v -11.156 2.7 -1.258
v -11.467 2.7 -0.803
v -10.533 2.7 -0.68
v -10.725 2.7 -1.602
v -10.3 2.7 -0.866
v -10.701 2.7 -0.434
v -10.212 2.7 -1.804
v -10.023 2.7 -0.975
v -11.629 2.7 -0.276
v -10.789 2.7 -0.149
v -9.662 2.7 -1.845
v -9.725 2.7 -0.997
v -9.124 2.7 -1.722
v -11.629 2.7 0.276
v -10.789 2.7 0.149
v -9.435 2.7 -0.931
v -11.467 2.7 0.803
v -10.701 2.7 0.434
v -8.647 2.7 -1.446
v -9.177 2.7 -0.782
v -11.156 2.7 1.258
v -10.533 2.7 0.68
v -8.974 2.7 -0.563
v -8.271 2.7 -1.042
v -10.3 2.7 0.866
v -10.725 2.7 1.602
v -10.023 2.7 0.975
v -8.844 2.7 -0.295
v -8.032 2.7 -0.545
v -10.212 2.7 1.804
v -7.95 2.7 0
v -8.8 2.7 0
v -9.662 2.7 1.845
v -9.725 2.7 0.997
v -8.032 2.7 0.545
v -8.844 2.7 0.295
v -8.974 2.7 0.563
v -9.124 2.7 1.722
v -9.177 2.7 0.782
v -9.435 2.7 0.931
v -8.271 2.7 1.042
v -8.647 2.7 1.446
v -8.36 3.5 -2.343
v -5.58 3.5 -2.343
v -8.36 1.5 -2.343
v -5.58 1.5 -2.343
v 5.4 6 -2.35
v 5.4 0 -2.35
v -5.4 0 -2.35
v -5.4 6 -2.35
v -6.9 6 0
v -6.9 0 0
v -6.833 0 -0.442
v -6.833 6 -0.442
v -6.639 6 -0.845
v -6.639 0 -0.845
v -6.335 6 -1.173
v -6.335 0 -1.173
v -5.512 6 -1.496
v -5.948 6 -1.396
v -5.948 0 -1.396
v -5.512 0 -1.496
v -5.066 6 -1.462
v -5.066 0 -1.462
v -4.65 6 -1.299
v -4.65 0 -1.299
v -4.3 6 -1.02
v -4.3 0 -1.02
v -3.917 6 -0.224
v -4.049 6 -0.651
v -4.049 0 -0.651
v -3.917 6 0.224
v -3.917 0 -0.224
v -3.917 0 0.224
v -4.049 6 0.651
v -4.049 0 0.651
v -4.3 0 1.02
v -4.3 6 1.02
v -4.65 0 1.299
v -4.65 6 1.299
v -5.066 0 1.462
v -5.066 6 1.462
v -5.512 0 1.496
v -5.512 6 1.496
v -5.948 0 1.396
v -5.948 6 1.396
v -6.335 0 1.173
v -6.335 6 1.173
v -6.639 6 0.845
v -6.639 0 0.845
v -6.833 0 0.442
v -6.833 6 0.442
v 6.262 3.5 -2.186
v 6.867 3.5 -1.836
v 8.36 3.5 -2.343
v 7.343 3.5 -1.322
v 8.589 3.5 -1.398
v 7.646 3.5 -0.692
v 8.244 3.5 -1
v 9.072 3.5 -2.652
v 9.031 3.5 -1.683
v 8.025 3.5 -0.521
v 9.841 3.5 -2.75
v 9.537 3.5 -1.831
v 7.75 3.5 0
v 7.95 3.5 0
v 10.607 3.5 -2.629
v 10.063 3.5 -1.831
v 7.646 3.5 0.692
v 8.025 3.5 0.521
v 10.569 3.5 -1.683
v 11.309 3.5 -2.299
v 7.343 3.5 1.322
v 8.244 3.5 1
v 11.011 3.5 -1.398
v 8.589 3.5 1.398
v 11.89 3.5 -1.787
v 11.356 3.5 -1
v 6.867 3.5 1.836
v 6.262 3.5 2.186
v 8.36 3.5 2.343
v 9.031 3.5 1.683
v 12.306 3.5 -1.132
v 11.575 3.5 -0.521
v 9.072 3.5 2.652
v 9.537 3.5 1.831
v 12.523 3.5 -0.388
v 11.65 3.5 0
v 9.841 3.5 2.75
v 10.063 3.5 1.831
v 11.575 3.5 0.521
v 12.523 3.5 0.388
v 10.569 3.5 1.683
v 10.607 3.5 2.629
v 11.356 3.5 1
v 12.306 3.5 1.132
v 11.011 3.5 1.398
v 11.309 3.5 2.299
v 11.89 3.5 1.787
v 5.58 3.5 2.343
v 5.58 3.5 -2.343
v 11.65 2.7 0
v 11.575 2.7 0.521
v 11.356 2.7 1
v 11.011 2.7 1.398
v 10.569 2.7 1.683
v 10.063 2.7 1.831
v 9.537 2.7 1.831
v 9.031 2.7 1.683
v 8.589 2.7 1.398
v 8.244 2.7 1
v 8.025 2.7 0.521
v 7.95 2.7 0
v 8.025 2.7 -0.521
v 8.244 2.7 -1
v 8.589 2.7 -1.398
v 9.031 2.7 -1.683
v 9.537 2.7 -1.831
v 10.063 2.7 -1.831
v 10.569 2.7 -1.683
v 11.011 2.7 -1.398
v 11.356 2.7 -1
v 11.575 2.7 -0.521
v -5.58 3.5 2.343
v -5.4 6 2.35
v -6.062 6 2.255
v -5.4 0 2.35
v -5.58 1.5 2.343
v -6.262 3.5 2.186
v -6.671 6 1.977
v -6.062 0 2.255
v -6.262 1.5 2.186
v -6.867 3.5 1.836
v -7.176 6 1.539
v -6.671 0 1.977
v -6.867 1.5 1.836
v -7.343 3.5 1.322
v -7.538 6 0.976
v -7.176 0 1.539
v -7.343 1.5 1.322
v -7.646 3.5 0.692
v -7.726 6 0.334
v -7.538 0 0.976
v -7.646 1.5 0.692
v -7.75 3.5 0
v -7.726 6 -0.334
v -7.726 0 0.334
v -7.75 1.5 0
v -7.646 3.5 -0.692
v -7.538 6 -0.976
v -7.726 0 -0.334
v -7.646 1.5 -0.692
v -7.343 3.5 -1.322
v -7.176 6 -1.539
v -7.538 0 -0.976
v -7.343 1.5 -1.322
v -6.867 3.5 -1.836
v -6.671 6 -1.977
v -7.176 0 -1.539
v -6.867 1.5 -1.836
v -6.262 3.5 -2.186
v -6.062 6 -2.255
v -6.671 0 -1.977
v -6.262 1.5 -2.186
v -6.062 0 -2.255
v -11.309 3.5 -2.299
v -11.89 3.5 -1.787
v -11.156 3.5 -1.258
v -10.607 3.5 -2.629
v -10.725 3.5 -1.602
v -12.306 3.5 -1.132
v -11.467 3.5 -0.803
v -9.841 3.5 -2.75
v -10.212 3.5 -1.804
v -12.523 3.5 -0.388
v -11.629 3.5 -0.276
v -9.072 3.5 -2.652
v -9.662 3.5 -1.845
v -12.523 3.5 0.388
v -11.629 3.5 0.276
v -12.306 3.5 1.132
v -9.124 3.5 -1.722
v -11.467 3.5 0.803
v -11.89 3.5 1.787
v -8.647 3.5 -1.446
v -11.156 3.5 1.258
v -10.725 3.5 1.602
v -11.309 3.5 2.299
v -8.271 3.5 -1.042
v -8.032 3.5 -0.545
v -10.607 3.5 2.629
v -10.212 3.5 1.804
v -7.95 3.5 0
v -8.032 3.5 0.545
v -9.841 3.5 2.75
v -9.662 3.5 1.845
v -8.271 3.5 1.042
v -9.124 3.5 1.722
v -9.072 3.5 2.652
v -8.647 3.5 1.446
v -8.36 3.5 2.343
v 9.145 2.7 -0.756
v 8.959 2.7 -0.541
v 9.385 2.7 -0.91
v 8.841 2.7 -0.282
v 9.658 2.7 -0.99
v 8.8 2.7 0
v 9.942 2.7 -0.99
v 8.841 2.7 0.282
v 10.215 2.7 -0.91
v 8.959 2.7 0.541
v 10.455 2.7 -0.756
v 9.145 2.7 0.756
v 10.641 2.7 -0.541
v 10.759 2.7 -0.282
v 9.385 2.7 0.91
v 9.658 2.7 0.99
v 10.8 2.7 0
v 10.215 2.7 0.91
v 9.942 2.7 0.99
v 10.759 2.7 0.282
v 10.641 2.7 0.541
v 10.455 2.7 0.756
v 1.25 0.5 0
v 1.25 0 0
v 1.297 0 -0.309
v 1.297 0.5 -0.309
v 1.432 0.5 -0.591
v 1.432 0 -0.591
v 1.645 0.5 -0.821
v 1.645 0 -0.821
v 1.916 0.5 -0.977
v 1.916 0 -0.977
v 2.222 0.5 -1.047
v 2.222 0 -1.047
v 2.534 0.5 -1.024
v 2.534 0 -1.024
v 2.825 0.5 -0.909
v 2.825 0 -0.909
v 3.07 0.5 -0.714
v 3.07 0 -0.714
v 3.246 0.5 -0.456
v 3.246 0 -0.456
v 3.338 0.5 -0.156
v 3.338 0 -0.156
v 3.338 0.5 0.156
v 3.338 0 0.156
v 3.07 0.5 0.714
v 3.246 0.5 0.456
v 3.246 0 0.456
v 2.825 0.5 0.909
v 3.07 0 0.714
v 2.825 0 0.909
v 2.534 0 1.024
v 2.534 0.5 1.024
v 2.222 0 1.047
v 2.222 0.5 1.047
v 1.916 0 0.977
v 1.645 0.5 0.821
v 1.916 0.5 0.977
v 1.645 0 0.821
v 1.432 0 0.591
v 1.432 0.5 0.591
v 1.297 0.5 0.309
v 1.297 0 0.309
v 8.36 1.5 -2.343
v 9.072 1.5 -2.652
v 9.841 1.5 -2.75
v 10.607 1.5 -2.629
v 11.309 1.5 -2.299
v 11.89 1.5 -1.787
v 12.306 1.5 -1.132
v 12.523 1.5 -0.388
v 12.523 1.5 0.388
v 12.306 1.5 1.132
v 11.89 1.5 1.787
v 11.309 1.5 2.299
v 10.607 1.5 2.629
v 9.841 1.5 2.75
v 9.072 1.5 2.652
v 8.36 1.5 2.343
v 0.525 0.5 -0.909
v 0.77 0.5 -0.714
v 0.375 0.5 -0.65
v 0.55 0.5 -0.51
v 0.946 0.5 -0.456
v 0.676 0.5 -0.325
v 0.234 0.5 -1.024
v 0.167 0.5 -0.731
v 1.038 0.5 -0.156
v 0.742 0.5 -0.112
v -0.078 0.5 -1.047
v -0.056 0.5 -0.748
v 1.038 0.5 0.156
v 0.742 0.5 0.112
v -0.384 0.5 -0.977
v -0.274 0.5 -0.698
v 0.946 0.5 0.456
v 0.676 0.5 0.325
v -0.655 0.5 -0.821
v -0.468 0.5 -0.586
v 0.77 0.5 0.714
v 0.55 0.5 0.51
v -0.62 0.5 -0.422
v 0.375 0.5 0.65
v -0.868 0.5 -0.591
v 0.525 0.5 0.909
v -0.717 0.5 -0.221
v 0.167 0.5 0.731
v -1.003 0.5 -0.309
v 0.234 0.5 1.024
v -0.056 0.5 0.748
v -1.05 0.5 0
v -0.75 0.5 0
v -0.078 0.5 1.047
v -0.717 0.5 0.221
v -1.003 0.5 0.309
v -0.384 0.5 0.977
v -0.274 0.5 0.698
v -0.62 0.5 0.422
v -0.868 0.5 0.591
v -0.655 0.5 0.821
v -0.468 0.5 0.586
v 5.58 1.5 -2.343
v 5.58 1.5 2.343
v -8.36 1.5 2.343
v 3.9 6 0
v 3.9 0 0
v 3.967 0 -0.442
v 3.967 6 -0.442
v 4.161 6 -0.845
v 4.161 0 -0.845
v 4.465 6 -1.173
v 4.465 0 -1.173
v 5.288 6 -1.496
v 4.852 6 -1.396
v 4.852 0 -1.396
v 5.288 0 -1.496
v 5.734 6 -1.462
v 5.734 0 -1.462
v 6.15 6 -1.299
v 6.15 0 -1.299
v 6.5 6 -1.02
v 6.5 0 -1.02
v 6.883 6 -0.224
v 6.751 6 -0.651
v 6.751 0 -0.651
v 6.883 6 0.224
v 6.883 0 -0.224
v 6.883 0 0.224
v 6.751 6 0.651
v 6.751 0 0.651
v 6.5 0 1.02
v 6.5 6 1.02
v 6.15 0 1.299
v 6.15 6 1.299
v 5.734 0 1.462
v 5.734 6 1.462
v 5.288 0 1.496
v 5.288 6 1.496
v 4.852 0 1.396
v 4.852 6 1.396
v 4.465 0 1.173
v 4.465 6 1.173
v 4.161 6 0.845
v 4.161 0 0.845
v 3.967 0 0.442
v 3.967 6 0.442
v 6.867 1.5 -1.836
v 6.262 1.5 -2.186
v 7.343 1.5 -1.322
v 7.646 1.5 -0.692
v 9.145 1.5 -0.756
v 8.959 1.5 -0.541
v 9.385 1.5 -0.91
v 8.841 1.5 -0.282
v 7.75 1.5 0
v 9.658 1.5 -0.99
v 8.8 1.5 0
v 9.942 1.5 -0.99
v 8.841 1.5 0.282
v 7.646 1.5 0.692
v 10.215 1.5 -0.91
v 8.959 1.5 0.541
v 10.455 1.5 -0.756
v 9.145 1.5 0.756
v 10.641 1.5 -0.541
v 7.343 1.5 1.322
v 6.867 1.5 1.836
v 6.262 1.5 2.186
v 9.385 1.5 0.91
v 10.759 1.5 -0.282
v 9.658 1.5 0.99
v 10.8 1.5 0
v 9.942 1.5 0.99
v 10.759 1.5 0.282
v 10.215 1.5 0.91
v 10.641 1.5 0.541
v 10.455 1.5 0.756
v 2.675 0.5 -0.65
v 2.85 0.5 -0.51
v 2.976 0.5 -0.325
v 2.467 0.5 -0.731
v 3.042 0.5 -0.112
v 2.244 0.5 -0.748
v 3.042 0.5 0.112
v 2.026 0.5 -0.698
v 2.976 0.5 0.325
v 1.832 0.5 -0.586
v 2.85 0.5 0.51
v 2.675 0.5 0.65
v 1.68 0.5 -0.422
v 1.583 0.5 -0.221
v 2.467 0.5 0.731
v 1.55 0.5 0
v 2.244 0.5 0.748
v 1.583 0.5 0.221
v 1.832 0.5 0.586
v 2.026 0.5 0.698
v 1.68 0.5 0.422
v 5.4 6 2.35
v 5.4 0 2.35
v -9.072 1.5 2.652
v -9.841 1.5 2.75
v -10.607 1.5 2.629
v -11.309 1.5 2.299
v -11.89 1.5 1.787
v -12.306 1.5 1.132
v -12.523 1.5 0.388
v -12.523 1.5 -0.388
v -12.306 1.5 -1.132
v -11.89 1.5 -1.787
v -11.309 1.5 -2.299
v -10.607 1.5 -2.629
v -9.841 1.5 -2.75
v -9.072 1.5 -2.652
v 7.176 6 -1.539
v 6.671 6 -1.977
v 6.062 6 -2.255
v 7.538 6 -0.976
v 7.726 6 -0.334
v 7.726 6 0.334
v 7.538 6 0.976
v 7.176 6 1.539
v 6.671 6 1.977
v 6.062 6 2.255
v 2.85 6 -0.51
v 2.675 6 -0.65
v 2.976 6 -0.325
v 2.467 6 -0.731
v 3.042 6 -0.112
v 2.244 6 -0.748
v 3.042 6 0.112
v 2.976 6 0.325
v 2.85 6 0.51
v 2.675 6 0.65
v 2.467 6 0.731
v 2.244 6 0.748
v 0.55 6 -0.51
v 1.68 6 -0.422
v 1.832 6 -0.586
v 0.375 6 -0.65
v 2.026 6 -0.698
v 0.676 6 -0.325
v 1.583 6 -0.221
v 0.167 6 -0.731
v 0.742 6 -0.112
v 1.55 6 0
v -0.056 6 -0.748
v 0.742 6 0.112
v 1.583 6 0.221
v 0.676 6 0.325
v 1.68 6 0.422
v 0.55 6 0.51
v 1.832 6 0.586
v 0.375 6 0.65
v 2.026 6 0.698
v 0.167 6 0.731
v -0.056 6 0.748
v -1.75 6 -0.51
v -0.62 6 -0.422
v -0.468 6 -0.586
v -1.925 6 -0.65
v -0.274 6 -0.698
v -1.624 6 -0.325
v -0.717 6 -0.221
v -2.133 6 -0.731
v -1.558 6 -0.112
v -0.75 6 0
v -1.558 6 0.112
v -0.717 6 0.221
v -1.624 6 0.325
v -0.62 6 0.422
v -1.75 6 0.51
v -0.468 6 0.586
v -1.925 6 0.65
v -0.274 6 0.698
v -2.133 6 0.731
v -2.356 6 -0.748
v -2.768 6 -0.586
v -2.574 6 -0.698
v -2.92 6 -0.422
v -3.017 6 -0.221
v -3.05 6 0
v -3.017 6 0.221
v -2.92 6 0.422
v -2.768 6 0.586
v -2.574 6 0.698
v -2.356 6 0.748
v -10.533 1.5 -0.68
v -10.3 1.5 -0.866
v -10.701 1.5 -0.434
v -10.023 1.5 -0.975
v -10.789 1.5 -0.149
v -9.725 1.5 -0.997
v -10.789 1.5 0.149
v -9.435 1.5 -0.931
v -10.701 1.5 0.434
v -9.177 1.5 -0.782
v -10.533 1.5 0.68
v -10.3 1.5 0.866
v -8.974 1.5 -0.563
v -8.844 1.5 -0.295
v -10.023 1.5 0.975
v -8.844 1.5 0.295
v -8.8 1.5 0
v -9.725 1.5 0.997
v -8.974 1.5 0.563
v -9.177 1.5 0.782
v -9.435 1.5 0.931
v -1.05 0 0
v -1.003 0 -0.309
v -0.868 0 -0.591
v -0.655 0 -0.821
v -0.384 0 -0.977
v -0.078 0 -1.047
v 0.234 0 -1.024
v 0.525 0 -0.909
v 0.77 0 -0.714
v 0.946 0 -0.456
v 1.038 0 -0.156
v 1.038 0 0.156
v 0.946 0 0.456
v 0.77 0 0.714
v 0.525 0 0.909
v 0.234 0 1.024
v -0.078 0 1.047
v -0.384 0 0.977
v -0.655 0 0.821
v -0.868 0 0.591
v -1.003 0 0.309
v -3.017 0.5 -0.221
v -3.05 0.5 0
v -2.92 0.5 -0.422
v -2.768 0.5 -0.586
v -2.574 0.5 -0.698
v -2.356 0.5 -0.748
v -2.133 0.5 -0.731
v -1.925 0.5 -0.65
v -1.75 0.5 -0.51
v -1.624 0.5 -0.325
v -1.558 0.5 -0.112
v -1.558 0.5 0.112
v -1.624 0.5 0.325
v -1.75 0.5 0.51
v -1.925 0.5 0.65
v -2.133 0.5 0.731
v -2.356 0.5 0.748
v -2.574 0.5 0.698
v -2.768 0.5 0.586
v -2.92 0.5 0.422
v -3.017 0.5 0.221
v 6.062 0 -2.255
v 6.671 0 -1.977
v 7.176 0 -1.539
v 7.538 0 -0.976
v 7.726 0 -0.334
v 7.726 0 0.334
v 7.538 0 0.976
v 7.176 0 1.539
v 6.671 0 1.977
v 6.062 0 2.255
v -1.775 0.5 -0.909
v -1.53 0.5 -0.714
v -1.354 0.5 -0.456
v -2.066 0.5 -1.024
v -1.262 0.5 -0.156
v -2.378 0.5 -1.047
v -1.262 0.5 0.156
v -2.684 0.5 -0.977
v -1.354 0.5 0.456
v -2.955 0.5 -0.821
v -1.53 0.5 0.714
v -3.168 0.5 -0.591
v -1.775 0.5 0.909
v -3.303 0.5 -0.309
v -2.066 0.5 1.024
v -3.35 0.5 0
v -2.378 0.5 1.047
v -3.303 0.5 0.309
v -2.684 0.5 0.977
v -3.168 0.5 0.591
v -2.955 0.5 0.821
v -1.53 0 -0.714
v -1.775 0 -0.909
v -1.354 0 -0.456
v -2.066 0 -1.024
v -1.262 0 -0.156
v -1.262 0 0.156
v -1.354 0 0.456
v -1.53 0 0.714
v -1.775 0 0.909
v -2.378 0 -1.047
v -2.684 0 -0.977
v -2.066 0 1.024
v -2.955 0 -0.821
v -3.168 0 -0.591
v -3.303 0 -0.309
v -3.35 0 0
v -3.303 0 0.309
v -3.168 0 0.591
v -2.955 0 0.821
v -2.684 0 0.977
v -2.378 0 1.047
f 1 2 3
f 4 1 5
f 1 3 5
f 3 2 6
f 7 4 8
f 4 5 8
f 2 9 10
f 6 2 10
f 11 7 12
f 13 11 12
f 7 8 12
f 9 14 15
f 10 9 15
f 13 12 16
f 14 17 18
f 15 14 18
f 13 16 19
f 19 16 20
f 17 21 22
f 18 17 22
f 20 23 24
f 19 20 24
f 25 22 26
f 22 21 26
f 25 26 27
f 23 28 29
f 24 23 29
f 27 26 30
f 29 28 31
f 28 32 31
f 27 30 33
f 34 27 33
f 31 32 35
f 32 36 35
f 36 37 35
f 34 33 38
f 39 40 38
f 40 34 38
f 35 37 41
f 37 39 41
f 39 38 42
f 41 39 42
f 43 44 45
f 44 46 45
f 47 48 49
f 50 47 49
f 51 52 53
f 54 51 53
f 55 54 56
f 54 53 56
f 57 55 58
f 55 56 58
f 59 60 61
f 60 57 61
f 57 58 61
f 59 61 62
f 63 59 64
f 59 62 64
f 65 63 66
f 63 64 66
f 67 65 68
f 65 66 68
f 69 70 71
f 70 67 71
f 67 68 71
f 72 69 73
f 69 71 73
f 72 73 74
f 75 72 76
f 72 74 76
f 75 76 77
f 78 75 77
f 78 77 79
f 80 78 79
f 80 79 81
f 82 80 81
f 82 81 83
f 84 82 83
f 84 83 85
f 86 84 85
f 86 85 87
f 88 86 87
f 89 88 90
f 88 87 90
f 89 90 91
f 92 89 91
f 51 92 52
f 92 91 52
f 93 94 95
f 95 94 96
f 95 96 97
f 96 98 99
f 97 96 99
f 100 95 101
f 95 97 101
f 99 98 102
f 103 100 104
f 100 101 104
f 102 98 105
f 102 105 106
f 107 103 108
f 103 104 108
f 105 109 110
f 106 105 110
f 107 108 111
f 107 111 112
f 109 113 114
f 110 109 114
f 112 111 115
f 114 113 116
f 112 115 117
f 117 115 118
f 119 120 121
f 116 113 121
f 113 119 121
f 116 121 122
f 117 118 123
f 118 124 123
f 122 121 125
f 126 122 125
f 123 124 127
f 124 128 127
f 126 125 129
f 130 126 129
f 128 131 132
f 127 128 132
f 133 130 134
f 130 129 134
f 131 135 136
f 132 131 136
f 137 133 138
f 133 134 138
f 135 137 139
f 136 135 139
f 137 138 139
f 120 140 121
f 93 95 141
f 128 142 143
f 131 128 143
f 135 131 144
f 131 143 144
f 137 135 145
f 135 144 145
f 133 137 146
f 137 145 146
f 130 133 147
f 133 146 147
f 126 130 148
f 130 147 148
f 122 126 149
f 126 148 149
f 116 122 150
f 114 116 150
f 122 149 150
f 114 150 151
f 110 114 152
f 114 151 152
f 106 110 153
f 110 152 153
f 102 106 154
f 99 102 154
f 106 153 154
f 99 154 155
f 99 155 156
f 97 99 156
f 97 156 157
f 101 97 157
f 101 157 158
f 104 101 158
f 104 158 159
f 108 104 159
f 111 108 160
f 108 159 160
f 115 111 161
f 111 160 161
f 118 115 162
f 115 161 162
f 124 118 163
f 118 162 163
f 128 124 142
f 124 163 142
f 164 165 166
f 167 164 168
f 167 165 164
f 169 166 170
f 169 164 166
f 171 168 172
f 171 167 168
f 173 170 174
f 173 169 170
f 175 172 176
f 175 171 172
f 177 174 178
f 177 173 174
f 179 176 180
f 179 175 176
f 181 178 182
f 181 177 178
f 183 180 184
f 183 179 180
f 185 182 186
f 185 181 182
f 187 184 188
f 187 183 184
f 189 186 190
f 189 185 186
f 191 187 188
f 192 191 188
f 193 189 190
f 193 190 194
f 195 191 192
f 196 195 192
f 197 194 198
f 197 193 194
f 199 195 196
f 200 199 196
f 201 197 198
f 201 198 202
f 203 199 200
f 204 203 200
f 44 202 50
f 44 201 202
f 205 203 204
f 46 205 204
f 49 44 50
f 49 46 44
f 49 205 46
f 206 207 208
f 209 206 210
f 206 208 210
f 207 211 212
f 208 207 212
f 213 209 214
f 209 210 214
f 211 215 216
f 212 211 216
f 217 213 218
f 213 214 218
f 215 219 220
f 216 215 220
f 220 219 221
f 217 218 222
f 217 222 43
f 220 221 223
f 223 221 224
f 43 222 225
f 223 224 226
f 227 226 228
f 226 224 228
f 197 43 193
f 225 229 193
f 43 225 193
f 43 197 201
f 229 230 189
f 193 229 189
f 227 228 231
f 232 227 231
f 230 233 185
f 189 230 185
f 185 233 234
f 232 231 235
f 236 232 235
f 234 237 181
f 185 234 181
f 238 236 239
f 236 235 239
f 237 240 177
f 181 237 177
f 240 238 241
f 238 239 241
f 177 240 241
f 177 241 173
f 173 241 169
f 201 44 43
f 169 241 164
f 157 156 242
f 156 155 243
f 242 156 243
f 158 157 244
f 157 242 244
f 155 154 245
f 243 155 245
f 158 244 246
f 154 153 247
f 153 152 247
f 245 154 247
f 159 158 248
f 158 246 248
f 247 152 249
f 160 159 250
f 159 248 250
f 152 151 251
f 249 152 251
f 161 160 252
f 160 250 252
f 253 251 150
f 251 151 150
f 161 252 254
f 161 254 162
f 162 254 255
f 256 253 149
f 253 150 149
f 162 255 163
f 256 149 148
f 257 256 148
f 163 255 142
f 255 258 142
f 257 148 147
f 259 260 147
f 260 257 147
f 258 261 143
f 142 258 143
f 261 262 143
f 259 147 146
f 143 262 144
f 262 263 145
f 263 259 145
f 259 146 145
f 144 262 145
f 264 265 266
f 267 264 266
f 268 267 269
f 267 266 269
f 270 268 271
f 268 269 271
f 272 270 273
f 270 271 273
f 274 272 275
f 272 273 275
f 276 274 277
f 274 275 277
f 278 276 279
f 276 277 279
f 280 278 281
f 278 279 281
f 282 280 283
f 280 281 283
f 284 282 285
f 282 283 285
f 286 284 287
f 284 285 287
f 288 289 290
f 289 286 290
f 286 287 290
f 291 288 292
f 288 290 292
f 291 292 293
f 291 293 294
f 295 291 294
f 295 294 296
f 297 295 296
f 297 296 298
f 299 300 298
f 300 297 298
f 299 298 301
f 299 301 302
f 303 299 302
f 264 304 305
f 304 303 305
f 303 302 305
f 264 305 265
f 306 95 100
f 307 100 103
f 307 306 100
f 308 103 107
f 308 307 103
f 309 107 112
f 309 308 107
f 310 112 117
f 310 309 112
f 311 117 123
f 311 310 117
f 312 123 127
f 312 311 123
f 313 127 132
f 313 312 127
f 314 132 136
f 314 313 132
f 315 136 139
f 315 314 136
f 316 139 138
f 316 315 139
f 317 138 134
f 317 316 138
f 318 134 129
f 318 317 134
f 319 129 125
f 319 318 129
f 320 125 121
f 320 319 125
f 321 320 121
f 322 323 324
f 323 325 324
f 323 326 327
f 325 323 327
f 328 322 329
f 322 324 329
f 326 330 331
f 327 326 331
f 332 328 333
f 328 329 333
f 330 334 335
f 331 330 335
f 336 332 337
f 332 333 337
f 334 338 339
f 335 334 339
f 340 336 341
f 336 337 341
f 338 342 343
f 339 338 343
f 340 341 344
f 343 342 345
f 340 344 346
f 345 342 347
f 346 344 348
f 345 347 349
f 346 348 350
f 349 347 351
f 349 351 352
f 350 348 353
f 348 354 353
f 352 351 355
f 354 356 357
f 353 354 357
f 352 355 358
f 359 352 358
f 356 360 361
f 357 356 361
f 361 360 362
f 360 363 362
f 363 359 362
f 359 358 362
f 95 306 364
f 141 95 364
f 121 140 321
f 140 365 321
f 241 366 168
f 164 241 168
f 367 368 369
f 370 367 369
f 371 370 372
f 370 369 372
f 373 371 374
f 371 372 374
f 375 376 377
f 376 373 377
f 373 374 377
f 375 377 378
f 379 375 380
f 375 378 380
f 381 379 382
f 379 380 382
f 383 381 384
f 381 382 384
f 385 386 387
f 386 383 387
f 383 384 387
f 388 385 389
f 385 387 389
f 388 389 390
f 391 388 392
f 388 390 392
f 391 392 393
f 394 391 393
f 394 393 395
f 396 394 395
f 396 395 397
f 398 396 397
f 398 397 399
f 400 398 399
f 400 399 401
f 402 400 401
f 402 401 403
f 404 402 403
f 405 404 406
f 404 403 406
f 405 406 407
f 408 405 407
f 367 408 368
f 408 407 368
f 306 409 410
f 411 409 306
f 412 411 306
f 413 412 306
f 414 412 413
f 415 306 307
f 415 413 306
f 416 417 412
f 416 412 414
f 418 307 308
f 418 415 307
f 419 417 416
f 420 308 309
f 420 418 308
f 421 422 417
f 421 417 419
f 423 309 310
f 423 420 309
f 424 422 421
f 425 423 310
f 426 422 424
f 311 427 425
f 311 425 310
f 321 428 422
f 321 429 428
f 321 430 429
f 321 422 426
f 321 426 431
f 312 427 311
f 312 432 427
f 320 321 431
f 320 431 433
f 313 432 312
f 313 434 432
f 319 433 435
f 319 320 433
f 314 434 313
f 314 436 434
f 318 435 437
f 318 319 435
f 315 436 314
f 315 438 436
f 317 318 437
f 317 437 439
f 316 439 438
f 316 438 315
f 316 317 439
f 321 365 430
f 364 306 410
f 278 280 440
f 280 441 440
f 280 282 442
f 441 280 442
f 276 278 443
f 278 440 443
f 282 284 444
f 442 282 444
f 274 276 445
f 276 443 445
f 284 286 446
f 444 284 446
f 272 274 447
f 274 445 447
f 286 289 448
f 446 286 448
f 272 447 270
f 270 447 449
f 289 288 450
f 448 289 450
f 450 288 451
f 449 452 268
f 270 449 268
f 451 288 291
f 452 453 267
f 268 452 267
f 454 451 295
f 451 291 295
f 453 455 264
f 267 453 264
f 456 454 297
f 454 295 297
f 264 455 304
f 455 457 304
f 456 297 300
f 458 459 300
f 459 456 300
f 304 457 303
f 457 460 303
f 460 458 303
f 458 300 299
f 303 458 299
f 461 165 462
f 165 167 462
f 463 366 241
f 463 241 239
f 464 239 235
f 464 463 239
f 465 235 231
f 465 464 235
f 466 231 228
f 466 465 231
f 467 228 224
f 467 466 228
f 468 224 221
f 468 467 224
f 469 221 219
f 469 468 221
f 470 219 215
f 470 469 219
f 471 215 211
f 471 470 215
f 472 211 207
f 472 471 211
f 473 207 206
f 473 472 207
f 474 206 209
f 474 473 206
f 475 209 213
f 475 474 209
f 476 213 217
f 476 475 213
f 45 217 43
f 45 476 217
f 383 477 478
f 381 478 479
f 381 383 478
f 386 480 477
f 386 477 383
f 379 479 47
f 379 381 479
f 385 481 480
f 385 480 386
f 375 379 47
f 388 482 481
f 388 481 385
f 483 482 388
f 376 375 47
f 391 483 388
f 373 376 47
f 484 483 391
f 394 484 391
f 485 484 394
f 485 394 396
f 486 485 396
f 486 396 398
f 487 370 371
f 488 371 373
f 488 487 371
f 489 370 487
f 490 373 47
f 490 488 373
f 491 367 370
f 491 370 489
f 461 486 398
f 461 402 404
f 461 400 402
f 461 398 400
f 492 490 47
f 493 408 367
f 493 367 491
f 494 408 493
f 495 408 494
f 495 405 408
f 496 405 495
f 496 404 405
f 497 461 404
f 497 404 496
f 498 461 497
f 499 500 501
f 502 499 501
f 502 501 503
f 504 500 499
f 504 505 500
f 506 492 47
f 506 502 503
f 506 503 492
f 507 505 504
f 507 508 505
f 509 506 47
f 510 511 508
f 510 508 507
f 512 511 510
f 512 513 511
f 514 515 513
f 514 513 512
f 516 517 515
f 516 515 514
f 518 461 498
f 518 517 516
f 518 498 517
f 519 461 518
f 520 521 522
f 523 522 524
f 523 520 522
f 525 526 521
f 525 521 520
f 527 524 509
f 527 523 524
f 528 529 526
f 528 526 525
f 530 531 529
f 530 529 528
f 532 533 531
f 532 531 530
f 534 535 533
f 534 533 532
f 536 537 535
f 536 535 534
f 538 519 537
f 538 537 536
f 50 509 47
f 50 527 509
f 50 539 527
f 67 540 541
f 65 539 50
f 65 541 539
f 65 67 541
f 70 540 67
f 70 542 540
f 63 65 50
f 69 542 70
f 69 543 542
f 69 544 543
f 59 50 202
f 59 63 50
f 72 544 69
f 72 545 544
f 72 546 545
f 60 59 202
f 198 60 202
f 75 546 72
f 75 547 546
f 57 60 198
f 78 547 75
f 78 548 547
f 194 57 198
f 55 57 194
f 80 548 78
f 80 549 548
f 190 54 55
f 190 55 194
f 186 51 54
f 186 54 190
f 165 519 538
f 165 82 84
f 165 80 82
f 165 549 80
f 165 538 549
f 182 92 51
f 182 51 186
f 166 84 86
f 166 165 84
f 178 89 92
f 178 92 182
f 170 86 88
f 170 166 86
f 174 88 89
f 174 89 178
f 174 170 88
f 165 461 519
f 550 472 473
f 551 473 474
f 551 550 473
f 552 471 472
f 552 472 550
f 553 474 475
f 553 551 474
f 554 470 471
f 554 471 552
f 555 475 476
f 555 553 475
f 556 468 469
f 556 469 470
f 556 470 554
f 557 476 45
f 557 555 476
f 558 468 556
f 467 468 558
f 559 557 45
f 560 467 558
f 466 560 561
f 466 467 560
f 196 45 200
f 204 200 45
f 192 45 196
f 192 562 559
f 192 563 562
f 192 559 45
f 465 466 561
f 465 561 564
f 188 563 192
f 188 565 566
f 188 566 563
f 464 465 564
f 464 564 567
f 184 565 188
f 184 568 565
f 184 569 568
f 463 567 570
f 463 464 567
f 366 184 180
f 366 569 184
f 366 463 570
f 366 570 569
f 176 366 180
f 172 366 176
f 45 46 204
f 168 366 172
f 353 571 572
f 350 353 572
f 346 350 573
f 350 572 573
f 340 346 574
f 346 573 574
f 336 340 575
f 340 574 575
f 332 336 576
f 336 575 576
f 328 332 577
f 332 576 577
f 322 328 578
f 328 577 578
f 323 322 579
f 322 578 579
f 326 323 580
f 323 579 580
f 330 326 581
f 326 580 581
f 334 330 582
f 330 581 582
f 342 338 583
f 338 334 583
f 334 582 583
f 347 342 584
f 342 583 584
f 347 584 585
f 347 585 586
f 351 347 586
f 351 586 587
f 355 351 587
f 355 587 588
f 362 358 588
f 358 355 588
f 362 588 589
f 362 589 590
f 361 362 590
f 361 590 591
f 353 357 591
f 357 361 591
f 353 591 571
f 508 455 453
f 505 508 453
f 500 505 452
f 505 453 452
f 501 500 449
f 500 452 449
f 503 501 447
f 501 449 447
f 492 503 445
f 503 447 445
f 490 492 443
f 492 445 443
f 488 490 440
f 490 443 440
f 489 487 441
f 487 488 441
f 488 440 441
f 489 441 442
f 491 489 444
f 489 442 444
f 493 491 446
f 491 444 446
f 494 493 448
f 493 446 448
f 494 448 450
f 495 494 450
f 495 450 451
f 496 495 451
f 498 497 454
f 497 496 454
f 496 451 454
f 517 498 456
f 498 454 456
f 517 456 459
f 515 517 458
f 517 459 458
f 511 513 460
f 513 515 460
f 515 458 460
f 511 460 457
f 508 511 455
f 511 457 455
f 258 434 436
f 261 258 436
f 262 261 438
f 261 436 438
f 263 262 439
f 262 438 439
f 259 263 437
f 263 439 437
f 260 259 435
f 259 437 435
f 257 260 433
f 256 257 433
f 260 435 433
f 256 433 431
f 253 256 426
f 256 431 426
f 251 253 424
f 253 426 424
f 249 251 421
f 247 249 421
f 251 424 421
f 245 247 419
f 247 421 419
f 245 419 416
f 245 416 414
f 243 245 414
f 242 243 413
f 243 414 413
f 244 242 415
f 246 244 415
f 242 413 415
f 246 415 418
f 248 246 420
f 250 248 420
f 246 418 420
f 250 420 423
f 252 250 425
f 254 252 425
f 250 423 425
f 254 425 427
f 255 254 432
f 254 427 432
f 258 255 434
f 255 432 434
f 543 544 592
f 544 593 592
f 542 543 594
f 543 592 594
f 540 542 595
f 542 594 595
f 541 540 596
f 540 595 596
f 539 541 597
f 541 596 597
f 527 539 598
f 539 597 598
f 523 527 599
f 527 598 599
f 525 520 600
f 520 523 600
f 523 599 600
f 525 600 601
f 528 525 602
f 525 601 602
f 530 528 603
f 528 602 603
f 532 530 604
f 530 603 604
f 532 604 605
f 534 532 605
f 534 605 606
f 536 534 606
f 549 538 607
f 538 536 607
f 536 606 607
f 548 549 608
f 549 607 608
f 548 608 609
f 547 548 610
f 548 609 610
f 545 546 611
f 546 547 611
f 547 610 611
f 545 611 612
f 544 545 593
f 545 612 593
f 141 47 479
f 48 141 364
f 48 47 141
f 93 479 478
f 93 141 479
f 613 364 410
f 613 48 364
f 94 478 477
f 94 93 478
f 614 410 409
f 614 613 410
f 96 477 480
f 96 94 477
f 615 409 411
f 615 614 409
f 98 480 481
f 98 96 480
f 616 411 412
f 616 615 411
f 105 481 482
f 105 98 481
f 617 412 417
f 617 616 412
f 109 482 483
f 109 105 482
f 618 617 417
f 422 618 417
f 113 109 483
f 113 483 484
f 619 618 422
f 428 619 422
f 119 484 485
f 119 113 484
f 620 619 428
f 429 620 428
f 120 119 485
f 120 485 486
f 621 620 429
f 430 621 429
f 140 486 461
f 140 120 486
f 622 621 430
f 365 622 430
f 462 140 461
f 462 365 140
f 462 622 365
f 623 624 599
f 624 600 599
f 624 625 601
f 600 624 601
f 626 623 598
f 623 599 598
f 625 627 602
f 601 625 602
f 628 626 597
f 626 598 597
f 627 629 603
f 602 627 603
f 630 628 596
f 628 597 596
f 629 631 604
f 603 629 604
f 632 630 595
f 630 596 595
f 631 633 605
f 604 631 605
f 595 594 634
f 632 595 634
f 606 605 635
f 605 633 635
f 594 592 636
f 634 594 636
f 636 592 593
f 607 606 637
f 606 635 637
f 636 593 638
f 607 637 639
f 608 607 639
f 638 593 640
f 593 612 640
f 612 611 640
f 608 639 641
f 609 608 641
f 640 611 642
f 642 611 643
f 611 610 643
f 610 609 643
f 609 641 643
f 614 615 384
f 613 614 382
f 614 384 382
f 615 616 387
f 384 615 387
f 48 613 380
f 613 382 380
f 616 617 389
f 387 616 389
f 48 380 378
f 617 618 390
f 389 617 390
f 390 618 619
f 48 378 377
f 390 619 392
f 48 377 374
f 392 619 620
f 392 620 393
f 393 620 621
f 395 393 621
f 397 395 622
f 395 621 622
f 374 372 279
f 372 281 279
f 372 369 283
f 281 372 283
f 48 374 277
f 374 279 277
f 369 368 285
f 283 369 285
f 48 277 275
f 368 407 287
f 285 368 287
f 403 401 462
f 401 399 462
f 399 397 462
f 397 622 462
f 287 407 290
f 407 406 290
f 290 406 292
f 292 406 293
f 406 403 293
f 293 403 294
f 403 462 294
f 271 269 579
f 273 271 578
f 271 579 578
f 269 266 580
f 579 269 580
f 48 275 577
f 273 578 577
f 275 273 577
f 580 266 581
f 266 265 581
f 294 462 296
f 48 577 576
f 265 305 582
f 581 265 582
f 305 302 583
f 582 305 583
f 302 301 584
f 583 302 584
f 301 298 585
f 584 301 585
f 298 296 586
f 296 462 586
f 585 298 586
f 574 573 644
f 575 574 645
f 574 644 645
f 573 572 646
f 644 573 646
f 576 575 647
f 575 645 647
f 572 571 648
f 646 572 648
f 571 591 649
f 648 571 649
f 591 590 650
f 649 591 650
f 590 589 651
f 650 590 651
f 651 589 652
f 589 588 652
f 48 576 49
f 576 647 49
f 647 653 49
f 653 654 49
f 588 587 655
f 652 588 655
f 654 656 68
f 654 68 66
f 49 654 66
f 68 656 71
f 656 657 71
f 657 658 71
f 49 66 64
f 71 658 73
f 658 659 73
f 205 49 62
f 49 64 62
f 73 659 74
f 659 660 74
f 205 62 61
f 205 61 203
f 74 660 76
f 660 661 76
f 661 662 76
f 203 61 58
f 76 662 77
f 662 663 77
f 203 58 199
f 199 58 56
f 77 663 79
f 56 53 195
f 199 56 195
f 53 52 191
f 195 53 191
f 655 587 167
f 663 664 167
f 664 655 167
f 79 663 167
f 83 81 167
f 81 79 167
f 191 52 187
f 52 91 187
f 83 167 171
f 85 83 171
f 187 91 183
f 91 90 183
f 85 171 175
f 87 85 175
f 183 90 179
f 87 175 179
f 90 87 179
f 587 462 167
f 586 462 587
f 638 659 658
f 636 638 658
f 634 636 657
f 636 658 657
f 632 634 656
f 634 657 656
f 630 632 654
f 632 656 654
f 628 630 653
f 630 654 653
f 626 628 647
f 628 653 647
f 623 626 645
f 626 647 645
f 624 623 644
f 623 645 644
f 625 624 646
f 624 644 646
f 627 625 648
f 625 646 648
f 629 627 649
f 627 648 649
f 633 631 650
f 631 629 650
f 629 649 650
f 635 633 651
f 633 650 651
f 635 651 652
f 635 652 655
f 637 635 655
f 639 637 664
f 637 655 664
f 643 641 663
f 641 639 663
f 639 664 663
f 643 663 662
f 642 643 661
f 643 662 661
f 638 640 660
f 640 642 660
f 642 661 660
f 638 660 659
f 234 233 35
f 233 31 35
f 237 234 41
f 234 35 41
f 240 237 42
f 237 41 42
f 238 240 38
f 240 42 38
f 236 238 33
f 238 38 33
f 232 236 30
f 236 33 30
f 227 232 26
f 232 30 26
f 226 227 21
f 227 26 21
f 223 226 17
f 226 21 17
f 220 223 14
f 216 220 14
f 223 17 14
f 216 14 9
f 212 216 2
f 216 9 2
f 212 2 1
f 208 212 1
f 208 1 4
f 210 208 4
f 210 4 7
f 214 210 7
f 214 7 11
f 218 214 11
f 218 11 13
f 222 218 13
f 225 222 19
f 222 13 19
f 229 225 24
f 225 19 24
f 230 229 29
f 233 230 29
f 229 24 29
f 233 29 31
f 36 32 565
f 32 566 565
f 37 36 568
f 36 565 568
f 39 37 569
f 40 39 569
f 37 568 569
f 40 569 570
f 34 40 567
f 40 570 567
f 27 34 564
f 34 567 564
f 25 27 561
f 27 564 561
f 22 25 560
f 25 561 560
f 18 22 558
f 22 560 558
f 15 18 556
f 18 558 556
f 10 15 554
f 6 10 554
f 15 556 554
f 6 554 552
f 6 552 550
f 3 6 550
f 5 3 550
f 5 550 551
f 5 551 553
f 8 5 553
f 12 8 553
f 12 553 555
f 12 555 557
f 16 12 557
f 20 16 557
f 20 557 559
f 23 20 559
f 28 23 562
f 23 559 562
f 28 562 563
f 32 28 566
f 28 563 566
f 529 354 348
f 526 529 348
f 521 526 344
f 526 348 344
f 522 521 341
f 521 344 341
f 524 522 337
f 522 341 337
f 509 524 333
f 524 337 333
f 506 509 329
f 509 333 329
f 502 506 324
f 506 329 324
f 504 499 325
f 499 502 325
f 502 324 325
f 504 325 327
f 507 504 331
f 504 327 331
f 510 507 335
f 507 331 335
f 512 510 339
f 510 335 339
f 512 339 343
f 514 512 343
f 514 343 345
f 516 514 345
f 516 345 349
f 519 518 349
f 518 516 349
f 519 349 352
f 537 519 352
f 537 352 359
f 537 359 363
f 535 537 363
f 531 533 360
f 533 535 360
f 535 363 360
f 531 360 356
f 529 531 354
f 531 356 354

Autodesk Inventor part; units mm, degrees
ref_plane "YZ Plane" through (0, 0, 0) normal (1, 0, 0) x (0, 1, 0)
ref_plane "XZ Plane" through (0, 0, 0) normal (0, 1, 0) x (-1, 0, 0)
sketch "Sketch1" plane through (0, 0, 0) normal (0, 1, 0) x (-1, 0, 0)
  line L0 (-8.55, 0) -> (-8.55, 0)
  line L1 (5.4, 2.35) -> (-5.4, 2.35)
  line L2 (-7.75, 0) -> (-7.75, 0)
  line L3 (7.75, 0) -> (7.75, 0)
  arc A0 (-5.4, 2.35) -> (-7.75, 0) centre (-5.4, 0) ccw
  arc A1 (-7.75, 0) -> (-5.4, -2.35) centre (-5.4, 0) ccw
  arc A2 (7.75, 0) -> (5.4, 2.35) centre (5.4, 0) ccw
  arc A3 (5.4, -2.35) -> (7.75, 0) centre (5.4, 0) ccw
  circle A4 centre (5.4, 0) radius 1.5
  circle A5 centre (-5.4, 0) radius 1.5
  circle A6 centre (2.3, 0) radius 0.75
  circle A7 centre (0, 0) radius 0.75
  circle A8 centre (-2.3, 0) radius 0.75
  circle A9 centre (2.3, 0) radius 0.35
  circle A10 centre (0, 0) radius 0.35
  circle A11 centre (-2.3, 0) radius 0.45
  line L4 (-15.2366, 19.4813) -> (26.8433, 19.4813) construction
  line L5 (26.8433, 19.4813) -> (26.8433, -5.0467) construction
  line L6 (26.8433, -5.0467) -> (-15.2366, -5.0467) construction
  line L7 (-15.2366, -5.0467) -> (-15.2366, 19.4813) construction
  line L8 (-8.3717, -2.35) -> (8.3717, -2.35)
  line L9 (8.3717, 2.35) -> (-8.3717, 2.35)
  circle A12 centre (2.3, 0) radius 1.05
  circle A13 centre (0, 0) radius 1.05
  circle A14 centre (-2.3, 0) radius 1.05
  point P0 (7.75, 0)
  point P1 (-5.4, -2.35)
  point P2 (5.4, -2.35)
  dimension "d5" = 2.35
  dimension "d6" = 3
  dimension "d7" = 3
  dimension "d10" = 1.5
  dimension "d11" = 4.6
  dimension "d14" = 0.9
  dimension "d201" = 2.1
  dimension "d202" = 2.1
  dimension "d203" = 2.1
  dimension "d204" = 1.5
  dimension "d205" = 1.5
extrude "Extrusion1" add sketch "Sketch1" along normal blind 6 contours A2 A3 L8 A1 A0 L1 | A12 | A13 | A14
ref_plane "Work Plane1" through (0, 1.5, 0) normal (0, -1, 0) x (1, 0, 0)
sketch "Sketch2" plane through (0, 1.5, 0) normal (0, -1, 0) x (1, 0, 0)
  line L0 (0, 0) -> (9.8, 0)
  circle A0 centre (9.8, 0) radius 1
  circle A1 centre (9.8, 0) radius 1.85
  circle A2 centre (9.8, 0) radius 2.75
  line L1 (-8.3604, 2.3431) -> (8.3604, 2.3431)
  line L2 (8.3604, -2.3431) -> (-8.3604, -2.3431)
  line L3 (-8.1293, 2.1844) -> (8.1293, -2.1844) construction
  line L4 (8.1293, 2.1844) -> (-8.7202, -2.3431) construction
  line L5 (0, 0) -> (-9.8, 0)
  circle A3 centre (-9.8, 0) radius 1
  circle A4 centre (-9.8, 0) radius 1.85
  circle A5 centre (-9.8, 0) radius 2.75
  dimension "d119" = 9.8
  dimension "d120" = 2
  dimension "d121" = 3.7
  dimension "d122" = 5.5
  dimension "d126" = 9.8
  dimension "d127" = 2
  dimension "d128" = 3.7
  dimension "d130" = 5.5
extrude "Extrusion2" add sketch "Sketch2" against normal blind 2 contours L5 A5 L1 A2 L0 | L0 A2 L2 A5 L5
extrude "Extrusion3" add sketch "Sketch2" against normal blind 2 contours A2 | A5
extrude "Extrusion4" add sketch "Sketch2" against normal blind 1.2 contours A1 | A3 | A4
sketch "Sketch3" plane through (-5.4, 0, 2.35) normal (0, 0, 1) x (1, 0, 0)
  line L0 (-9.7661, 9.6728) -> (32.2033, 9.6728) construction
  line L1 (32.2033, 9.6728) -> (32.2033, -14.7908) construction
  line L2 (32.2033, -14.7908) -> (-9.7661, -14.7908) construction
  line L3 (-9.7661, -14.7908) -> (-9.7661, 9.6728) construction
  point P0 (5.4, 0)
extrude "Extrusion5" cut sketch "Sketch2" against normal through all contours A0 | A3
extrude "Extrusion6" cut sketch "Sketch1" along normal through all contours A4 | A5
extrude "Extrusion7" cut sketch "Sketch1" along normal blind 10 contours A6 | A7 | A8 | A9 | A10 | A11
extrude "Extrusion8" cut sketch "Sketch1" along normal blind 0.5 contours A12 | A13 | A14
properties part number "Pogo2" material "Nylon 6/6"
